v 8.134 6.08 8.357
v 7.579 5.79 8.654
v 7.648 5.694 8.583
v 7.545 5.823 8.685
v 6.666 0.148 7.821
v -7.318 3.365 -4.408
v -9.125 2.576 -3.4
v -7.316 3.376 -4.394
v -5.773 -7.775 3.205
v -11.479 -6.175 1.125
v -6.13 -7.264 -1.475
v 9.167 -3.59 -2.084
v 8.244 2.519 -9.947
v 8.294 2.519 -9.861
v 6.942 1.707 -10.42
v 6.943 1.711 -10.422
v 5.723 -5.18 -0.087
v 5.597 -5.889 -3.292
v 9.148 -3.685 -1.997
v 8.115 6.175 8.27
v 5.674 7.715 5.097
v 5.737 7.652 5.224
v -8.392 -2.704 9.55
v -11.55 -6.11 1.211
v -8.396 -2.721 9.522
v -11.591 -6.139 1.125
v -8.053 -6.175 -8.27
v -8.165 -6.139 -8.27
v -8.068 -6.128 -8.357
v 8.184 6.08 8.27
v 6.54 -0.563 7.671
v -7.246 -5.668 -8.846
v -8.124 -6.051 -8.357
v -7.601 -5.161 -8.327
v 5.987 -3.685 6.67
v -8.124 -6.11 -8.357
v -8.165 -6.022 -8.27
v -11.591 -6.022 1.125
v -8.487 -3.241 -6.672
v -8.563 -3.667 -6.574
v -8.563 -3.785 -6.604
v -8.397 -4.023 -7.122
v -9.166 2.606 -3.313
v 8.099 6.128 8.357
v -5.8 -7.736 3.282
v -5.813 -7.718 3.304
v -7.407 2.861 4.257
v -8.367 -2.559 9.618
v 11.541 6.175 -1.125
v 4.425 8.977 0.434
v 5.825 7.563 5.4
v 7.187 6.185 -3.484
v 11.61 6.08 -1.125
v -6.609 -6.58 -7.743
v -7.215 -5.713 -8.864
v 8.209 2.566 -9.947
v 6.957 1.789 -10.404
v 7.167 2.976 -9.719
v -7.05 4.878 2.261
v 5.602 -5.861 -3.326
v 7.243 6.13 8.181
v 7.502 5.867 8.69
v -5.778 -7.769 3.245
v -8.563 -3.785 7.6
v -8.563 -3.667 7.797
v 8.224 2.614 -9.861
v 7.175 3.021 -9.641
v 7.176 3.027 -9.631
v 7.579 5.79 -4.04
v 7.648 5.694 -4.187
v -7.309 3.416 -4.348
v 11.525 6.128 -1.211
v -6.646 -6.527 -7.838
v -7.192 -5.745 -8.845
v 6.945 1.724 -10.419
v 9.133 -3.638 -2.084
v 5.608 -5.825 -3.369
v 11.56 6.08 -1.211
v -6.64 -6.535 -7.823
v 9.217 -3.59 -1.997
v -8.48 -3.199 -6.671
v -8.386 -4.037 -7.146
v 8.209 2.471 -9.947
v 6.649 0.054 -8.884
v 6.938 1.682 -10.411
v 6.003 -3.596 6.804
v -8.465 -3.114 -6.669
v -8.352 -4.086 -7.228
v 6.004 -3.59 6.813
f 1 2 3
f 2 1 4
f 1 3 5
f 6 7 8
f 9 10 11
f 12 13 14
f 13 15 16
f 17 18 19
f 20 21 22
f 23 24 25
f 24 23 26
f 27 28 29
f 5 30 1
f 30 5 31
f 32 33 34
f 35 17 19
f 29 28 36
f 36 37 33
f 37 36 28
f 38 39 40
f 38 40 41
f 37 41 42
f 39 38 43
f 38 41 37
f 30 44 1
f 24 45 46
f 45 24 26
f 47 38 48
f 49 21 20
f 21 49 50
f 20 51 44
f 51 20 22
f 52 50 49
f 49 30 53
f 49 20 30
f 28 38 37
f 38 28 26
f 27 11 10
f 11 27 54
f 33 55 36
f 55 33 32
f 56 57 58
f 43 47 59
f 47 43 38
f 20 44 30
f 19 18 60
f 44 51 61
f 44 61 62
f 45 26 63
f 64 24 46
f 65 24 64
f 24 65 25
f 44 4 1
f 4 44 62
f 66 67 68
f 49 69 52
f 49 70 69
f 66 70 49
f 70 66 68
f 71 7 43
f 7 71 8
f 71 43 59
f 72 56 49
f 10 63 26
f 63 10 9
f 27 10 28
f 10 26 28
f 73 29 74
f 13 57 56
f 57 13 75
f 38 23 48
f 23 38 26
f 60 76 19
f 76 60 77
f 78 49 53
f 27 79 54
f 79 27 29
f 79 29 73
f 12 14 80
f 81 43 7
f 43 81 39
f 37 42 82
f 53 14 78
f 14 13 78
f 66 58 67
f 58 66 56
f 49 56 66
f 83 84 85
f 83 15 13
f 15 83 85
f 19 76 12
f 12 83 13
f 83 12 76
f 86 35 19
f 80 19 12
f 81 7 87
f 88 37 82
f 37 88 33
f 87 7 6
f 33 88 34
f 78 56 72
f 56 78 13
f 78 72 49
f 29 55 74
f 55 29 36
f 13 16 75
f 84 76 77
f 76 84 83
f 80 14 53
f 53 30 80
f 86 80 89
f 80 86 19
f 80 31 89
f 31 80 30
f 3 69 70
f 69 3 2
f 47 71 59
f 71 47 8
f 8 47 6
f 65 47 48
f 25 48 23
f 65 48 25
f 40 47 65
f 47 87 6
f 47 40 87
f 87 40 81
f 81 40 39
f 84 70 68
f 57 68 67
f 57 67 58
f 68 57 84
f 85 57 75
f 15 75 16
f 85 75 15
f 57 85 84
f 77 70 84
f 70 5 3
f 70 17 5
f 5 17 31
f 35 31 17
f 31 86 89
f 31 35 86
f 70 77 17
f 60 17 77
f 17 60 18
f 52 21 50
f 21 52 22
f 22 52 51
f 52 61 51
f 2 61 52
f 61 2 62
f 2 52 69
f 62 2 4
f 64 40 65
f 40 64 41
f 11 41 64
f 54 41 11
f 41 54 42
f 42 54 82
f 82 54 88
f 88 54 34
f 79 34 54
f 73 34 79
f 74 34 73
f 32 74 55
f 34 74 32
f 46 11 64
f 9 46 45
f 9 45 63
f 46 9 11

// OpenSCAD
// Auto-generated OpenSCAD file

    inner_points = 10*[[-0.1519325222677969, -0.49588870782043115, 1.2071067811865481], [-0.2752191363280171, -1.1921648102349602, 0.5000000000000018], [0.14570769345513235, 1.185070501785053, -0.5000000000000018], [0.02242107939491221, 0.4887943993705236, -1.2071067811865481], [0.02242107939513263, 0.4887943993704884, 1.2071067811865466], [-0.2752191363281084, -1.1921648102349456, -0.499999999999998], [0.14570769345522366, 1.1850705017850383, 0.499999999999998], [-0.15193252226801734, -0.49588870782039596, -1.2071067811865466], [-0.848208624682401, -0.37260209376026526, 0.5000000000000662], [-0.6738550230195627, 0.612081013430669, -0.4999999999999354], [-0.6738550230194714, 0.6120810134306545, 0.5000000000000646], [-0.8482086246824923, -0.3726020937602507, -0.49999999999993383], [0.6315203809781617, -0.12683376828511966, 0.7071067811864822], [0.5082337669179414, -0.8231098706996488, -6.428191312579656e-14], [0.7548069950382528, 0.56944233412943, -6.644684802381562e-14], [0.6315203809780325, -0.1268337682850991, -0.7071067811866129]];

    outer_points = 10*[[-0.007761474101058263, 0.2518537970485801, 1.282035961125326], [-0.8193543823962504, -0.2518537970485801, 0.9860704042545944], [0.8193543823962504, 0.2518537970485801, -0.9860704042545944], [0.007761474101058263, -0.2518537970485801, -1.282035961125326], [0.8083780004585261, 0.608028852569843, 0.8270022394188679], [-1.1509806058735501, -0.608028852569843, 0.11247817802624172], [1.1509806058735501, 0.608028852569843, -0.11247817802624172], [-0.8083780004585261, -0.608028852569843, -0.8270022394188679], [-0.5768761153857935, 0.6108513156443435, 0.54228647196198], [-0.09236286430350876, 0.6108513156443435, -0.786339475972831], [0.23926335917379102, 0.9670263711656064, 0.08725275025552175], [-0.9085023388630934, 0.25467626012308053, -0.3313057542663727], [0.5691146412847352, -0.3589975185957634, 0.7397494891633462], [-0.24247826701045683, -0.8627051126929235, 0.44378393229261437], [0.9117172466997592, -0.3589975185957634, -0.19973092828176342], [0.10012433840456708, -0.8627051126929235, -0.4956964851524952]];

    // Convex hull for inner set (I)
    module inner_hull() {
        hull() {
            for (p = inner_points) {
                translate(p) sphere(r=0.1);
            }
        }
    }

    // Convex hull for outer set (O) minus inner hull (O \ I)
    module outer_minus_inner() {
        difference() {
            hull() {
                for (p = outer_points) {
                    translate(p) sphere(r=0.1);
                }
            }
            inner_hull(); // Subtract inner hull
        }
    }

    // Convex hull for outer set (O) minus all translated inner hulls
    module outer_minus_AllTranslationInner() {
        difference() {
            hull() {
                for (p = outer_points) {
                    translate(p) sphere(r=0.1);
                }
            }
            hull() {
                translate([0,0,50]) inner_hull();
                translate([0,0,-50]) inner_hull();
            }; // Subtract translated inner hulls
        }
    }

    // Difference between outer_minus_inner and outer_minus_AllTranslationInner
    module outer_minus_inner_diff() {
        difference() {
            // Outer minus inner
            difference() {
                hull() {
                    for (p = outer_points) {
                        translate(p) sphere(r=0.1);
                    }
                }
                inner_hull();
            }

            // Subtract Outer minus AllTranslationInner
            difference() {
                hull() {
                    for (p = outer_points) {
                        translate(p) sphere(r=0.1);
                    }
                }
                hull() {
                    translate([0,0,50]) inner_hull();
                    translate([0,0,-50]) inner_hull();
                };
            }
        }
    }

    // Rendering all with colors applied
    color([0, 1, 0, 1]) outer_minus_AllTranslationInner(); // Opaque green
    
